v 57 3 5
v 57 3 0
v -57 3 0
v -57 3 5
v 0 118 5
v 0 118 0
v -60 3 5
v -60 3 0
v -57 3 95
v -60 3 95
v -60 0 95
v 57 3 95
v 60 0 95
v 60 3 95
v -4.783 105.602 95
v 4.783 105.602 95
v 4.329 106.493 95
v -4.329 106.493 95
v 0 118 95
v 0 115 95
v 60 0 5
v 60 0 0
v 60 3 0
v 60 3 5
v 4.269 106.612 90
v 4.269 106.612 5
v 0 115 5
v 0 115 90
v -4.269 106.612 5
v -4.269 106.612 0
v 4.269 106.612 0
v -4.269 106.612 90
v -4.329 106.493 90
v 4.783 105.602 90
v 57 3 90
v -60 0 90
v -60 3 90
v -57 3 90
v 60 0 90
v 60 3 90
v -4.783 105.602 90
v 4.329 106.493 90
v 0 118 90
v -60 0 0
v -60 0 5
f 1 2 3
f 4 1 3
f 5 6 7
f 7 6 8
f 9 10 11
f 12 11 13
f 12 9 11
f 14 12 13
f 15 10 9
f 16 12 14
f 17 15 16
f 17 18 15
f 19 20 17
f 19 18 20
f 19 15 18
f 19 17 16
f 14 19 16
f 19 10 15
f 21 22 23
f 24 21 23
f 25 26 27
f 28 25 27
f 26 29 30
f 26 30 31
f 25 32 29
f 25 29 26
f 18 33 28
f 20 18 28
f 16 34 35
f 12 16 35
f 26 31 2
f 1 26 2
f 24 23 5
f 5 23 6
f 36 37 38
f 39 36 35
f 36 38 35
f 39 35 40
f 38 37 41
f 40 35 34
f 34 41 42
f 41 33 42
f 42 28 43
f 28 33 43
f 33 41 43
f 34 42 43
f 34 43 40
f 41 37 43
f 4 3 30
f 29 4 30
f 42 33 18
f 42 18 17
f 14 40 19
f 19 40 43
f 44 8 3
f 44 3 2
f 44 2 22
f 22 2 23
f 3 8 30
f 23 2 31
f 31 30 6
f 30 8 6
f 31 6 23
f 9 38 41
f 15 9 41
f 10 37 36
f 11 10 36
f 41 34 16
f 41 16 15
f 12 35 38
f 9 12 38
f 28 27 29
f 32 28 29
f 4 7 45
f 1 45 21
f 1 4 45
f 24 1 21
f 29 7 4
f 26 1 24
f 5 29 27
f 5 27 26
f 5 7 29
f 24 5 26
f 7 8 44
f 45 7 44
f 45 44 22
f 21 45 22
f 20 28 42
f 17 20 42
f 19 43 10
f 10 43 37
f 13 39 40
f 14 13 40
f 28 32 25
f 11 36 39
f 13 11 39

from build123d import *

# Parameters (mm, degrees)
F1_DEPTH      = 5
F3_DEPTH      = 85
F3_DEPTH_BACK = 5
F5_DEPTH      = 5
F7_DEPTH      = 5


# Not quite as in the source:
# - a feature names something its author has since deleted; it is built from what else it names


with BuildPart() as f1:
    # F0 (on Top) → F1 (new body)
    with BuildSketch(Plane.XY):
        Polygon((0, 118), (-60, 3), (-57, 3), (0, 115), (57, 3), (60, 3), align=None)
        Polygon((-60, 0), (0, 0), (60, 0), (60, 3), (57, 3), (-57, 3), (-60, 3), align=None)
    extrude(amount=F1_DEPTH)

    # F2 (on face) → F3 (join, two sides)
    with BuildSketch(Plane.XY.offset(5)) as f3_sk:
        Polygon((-4.2687140089, 106.6123514211), (4.2687140089, 106.6123514211), (0, 115), align=None)
    extrude(amount=F3_DEPTH)
    extrude(f3_sk.sketch, amount=-F3_DEPTH_BACK)


with BuildPart() as f5:
    # F4 (on face) → F5 (new body)
    with BuildSketch(Plane.XY.offset(90)):
        Polygon((0, 118), (0, 115), (4.2687140089, 106.6123514211), (56.999907785, 3.0001811943), (59.999907785, 3.0001811943), align=None)
        Polygon((-4.2687140089, 106.6123514211), (0, 115), (0, 118), (-59.999907785, 3.0001811943), (-56.999907785, 3.0001811943), align=None)
        Polygon((56.999907785, 3.0001811943), (-56.999907785, 3.0001811943), (-59.999907785, 3.0001811943), (-59.999907785, 0.0001811943), (59.999907785, 0.0001811943), (59.999907785, 3.0001811943), align=None)
    extrude(amount=F5_DEPTH)

    # F6 (on face) → F7 (join)
    with BuildSketch(Plane(origin=(0, 0, 90), x_dir=(1, 0, 0), z_dir=(0, 0, -1))):
        Polygon((-4.782894762, -105.6020313448), (-4.3293266249, -106.4932529475), (4.3293266249, -106.4932529475), (4.782894762, -105.6020313448), align=None)
    extrude(amount=-F7_DEPTH)


solid = Compound([f1.part, f5.part])
